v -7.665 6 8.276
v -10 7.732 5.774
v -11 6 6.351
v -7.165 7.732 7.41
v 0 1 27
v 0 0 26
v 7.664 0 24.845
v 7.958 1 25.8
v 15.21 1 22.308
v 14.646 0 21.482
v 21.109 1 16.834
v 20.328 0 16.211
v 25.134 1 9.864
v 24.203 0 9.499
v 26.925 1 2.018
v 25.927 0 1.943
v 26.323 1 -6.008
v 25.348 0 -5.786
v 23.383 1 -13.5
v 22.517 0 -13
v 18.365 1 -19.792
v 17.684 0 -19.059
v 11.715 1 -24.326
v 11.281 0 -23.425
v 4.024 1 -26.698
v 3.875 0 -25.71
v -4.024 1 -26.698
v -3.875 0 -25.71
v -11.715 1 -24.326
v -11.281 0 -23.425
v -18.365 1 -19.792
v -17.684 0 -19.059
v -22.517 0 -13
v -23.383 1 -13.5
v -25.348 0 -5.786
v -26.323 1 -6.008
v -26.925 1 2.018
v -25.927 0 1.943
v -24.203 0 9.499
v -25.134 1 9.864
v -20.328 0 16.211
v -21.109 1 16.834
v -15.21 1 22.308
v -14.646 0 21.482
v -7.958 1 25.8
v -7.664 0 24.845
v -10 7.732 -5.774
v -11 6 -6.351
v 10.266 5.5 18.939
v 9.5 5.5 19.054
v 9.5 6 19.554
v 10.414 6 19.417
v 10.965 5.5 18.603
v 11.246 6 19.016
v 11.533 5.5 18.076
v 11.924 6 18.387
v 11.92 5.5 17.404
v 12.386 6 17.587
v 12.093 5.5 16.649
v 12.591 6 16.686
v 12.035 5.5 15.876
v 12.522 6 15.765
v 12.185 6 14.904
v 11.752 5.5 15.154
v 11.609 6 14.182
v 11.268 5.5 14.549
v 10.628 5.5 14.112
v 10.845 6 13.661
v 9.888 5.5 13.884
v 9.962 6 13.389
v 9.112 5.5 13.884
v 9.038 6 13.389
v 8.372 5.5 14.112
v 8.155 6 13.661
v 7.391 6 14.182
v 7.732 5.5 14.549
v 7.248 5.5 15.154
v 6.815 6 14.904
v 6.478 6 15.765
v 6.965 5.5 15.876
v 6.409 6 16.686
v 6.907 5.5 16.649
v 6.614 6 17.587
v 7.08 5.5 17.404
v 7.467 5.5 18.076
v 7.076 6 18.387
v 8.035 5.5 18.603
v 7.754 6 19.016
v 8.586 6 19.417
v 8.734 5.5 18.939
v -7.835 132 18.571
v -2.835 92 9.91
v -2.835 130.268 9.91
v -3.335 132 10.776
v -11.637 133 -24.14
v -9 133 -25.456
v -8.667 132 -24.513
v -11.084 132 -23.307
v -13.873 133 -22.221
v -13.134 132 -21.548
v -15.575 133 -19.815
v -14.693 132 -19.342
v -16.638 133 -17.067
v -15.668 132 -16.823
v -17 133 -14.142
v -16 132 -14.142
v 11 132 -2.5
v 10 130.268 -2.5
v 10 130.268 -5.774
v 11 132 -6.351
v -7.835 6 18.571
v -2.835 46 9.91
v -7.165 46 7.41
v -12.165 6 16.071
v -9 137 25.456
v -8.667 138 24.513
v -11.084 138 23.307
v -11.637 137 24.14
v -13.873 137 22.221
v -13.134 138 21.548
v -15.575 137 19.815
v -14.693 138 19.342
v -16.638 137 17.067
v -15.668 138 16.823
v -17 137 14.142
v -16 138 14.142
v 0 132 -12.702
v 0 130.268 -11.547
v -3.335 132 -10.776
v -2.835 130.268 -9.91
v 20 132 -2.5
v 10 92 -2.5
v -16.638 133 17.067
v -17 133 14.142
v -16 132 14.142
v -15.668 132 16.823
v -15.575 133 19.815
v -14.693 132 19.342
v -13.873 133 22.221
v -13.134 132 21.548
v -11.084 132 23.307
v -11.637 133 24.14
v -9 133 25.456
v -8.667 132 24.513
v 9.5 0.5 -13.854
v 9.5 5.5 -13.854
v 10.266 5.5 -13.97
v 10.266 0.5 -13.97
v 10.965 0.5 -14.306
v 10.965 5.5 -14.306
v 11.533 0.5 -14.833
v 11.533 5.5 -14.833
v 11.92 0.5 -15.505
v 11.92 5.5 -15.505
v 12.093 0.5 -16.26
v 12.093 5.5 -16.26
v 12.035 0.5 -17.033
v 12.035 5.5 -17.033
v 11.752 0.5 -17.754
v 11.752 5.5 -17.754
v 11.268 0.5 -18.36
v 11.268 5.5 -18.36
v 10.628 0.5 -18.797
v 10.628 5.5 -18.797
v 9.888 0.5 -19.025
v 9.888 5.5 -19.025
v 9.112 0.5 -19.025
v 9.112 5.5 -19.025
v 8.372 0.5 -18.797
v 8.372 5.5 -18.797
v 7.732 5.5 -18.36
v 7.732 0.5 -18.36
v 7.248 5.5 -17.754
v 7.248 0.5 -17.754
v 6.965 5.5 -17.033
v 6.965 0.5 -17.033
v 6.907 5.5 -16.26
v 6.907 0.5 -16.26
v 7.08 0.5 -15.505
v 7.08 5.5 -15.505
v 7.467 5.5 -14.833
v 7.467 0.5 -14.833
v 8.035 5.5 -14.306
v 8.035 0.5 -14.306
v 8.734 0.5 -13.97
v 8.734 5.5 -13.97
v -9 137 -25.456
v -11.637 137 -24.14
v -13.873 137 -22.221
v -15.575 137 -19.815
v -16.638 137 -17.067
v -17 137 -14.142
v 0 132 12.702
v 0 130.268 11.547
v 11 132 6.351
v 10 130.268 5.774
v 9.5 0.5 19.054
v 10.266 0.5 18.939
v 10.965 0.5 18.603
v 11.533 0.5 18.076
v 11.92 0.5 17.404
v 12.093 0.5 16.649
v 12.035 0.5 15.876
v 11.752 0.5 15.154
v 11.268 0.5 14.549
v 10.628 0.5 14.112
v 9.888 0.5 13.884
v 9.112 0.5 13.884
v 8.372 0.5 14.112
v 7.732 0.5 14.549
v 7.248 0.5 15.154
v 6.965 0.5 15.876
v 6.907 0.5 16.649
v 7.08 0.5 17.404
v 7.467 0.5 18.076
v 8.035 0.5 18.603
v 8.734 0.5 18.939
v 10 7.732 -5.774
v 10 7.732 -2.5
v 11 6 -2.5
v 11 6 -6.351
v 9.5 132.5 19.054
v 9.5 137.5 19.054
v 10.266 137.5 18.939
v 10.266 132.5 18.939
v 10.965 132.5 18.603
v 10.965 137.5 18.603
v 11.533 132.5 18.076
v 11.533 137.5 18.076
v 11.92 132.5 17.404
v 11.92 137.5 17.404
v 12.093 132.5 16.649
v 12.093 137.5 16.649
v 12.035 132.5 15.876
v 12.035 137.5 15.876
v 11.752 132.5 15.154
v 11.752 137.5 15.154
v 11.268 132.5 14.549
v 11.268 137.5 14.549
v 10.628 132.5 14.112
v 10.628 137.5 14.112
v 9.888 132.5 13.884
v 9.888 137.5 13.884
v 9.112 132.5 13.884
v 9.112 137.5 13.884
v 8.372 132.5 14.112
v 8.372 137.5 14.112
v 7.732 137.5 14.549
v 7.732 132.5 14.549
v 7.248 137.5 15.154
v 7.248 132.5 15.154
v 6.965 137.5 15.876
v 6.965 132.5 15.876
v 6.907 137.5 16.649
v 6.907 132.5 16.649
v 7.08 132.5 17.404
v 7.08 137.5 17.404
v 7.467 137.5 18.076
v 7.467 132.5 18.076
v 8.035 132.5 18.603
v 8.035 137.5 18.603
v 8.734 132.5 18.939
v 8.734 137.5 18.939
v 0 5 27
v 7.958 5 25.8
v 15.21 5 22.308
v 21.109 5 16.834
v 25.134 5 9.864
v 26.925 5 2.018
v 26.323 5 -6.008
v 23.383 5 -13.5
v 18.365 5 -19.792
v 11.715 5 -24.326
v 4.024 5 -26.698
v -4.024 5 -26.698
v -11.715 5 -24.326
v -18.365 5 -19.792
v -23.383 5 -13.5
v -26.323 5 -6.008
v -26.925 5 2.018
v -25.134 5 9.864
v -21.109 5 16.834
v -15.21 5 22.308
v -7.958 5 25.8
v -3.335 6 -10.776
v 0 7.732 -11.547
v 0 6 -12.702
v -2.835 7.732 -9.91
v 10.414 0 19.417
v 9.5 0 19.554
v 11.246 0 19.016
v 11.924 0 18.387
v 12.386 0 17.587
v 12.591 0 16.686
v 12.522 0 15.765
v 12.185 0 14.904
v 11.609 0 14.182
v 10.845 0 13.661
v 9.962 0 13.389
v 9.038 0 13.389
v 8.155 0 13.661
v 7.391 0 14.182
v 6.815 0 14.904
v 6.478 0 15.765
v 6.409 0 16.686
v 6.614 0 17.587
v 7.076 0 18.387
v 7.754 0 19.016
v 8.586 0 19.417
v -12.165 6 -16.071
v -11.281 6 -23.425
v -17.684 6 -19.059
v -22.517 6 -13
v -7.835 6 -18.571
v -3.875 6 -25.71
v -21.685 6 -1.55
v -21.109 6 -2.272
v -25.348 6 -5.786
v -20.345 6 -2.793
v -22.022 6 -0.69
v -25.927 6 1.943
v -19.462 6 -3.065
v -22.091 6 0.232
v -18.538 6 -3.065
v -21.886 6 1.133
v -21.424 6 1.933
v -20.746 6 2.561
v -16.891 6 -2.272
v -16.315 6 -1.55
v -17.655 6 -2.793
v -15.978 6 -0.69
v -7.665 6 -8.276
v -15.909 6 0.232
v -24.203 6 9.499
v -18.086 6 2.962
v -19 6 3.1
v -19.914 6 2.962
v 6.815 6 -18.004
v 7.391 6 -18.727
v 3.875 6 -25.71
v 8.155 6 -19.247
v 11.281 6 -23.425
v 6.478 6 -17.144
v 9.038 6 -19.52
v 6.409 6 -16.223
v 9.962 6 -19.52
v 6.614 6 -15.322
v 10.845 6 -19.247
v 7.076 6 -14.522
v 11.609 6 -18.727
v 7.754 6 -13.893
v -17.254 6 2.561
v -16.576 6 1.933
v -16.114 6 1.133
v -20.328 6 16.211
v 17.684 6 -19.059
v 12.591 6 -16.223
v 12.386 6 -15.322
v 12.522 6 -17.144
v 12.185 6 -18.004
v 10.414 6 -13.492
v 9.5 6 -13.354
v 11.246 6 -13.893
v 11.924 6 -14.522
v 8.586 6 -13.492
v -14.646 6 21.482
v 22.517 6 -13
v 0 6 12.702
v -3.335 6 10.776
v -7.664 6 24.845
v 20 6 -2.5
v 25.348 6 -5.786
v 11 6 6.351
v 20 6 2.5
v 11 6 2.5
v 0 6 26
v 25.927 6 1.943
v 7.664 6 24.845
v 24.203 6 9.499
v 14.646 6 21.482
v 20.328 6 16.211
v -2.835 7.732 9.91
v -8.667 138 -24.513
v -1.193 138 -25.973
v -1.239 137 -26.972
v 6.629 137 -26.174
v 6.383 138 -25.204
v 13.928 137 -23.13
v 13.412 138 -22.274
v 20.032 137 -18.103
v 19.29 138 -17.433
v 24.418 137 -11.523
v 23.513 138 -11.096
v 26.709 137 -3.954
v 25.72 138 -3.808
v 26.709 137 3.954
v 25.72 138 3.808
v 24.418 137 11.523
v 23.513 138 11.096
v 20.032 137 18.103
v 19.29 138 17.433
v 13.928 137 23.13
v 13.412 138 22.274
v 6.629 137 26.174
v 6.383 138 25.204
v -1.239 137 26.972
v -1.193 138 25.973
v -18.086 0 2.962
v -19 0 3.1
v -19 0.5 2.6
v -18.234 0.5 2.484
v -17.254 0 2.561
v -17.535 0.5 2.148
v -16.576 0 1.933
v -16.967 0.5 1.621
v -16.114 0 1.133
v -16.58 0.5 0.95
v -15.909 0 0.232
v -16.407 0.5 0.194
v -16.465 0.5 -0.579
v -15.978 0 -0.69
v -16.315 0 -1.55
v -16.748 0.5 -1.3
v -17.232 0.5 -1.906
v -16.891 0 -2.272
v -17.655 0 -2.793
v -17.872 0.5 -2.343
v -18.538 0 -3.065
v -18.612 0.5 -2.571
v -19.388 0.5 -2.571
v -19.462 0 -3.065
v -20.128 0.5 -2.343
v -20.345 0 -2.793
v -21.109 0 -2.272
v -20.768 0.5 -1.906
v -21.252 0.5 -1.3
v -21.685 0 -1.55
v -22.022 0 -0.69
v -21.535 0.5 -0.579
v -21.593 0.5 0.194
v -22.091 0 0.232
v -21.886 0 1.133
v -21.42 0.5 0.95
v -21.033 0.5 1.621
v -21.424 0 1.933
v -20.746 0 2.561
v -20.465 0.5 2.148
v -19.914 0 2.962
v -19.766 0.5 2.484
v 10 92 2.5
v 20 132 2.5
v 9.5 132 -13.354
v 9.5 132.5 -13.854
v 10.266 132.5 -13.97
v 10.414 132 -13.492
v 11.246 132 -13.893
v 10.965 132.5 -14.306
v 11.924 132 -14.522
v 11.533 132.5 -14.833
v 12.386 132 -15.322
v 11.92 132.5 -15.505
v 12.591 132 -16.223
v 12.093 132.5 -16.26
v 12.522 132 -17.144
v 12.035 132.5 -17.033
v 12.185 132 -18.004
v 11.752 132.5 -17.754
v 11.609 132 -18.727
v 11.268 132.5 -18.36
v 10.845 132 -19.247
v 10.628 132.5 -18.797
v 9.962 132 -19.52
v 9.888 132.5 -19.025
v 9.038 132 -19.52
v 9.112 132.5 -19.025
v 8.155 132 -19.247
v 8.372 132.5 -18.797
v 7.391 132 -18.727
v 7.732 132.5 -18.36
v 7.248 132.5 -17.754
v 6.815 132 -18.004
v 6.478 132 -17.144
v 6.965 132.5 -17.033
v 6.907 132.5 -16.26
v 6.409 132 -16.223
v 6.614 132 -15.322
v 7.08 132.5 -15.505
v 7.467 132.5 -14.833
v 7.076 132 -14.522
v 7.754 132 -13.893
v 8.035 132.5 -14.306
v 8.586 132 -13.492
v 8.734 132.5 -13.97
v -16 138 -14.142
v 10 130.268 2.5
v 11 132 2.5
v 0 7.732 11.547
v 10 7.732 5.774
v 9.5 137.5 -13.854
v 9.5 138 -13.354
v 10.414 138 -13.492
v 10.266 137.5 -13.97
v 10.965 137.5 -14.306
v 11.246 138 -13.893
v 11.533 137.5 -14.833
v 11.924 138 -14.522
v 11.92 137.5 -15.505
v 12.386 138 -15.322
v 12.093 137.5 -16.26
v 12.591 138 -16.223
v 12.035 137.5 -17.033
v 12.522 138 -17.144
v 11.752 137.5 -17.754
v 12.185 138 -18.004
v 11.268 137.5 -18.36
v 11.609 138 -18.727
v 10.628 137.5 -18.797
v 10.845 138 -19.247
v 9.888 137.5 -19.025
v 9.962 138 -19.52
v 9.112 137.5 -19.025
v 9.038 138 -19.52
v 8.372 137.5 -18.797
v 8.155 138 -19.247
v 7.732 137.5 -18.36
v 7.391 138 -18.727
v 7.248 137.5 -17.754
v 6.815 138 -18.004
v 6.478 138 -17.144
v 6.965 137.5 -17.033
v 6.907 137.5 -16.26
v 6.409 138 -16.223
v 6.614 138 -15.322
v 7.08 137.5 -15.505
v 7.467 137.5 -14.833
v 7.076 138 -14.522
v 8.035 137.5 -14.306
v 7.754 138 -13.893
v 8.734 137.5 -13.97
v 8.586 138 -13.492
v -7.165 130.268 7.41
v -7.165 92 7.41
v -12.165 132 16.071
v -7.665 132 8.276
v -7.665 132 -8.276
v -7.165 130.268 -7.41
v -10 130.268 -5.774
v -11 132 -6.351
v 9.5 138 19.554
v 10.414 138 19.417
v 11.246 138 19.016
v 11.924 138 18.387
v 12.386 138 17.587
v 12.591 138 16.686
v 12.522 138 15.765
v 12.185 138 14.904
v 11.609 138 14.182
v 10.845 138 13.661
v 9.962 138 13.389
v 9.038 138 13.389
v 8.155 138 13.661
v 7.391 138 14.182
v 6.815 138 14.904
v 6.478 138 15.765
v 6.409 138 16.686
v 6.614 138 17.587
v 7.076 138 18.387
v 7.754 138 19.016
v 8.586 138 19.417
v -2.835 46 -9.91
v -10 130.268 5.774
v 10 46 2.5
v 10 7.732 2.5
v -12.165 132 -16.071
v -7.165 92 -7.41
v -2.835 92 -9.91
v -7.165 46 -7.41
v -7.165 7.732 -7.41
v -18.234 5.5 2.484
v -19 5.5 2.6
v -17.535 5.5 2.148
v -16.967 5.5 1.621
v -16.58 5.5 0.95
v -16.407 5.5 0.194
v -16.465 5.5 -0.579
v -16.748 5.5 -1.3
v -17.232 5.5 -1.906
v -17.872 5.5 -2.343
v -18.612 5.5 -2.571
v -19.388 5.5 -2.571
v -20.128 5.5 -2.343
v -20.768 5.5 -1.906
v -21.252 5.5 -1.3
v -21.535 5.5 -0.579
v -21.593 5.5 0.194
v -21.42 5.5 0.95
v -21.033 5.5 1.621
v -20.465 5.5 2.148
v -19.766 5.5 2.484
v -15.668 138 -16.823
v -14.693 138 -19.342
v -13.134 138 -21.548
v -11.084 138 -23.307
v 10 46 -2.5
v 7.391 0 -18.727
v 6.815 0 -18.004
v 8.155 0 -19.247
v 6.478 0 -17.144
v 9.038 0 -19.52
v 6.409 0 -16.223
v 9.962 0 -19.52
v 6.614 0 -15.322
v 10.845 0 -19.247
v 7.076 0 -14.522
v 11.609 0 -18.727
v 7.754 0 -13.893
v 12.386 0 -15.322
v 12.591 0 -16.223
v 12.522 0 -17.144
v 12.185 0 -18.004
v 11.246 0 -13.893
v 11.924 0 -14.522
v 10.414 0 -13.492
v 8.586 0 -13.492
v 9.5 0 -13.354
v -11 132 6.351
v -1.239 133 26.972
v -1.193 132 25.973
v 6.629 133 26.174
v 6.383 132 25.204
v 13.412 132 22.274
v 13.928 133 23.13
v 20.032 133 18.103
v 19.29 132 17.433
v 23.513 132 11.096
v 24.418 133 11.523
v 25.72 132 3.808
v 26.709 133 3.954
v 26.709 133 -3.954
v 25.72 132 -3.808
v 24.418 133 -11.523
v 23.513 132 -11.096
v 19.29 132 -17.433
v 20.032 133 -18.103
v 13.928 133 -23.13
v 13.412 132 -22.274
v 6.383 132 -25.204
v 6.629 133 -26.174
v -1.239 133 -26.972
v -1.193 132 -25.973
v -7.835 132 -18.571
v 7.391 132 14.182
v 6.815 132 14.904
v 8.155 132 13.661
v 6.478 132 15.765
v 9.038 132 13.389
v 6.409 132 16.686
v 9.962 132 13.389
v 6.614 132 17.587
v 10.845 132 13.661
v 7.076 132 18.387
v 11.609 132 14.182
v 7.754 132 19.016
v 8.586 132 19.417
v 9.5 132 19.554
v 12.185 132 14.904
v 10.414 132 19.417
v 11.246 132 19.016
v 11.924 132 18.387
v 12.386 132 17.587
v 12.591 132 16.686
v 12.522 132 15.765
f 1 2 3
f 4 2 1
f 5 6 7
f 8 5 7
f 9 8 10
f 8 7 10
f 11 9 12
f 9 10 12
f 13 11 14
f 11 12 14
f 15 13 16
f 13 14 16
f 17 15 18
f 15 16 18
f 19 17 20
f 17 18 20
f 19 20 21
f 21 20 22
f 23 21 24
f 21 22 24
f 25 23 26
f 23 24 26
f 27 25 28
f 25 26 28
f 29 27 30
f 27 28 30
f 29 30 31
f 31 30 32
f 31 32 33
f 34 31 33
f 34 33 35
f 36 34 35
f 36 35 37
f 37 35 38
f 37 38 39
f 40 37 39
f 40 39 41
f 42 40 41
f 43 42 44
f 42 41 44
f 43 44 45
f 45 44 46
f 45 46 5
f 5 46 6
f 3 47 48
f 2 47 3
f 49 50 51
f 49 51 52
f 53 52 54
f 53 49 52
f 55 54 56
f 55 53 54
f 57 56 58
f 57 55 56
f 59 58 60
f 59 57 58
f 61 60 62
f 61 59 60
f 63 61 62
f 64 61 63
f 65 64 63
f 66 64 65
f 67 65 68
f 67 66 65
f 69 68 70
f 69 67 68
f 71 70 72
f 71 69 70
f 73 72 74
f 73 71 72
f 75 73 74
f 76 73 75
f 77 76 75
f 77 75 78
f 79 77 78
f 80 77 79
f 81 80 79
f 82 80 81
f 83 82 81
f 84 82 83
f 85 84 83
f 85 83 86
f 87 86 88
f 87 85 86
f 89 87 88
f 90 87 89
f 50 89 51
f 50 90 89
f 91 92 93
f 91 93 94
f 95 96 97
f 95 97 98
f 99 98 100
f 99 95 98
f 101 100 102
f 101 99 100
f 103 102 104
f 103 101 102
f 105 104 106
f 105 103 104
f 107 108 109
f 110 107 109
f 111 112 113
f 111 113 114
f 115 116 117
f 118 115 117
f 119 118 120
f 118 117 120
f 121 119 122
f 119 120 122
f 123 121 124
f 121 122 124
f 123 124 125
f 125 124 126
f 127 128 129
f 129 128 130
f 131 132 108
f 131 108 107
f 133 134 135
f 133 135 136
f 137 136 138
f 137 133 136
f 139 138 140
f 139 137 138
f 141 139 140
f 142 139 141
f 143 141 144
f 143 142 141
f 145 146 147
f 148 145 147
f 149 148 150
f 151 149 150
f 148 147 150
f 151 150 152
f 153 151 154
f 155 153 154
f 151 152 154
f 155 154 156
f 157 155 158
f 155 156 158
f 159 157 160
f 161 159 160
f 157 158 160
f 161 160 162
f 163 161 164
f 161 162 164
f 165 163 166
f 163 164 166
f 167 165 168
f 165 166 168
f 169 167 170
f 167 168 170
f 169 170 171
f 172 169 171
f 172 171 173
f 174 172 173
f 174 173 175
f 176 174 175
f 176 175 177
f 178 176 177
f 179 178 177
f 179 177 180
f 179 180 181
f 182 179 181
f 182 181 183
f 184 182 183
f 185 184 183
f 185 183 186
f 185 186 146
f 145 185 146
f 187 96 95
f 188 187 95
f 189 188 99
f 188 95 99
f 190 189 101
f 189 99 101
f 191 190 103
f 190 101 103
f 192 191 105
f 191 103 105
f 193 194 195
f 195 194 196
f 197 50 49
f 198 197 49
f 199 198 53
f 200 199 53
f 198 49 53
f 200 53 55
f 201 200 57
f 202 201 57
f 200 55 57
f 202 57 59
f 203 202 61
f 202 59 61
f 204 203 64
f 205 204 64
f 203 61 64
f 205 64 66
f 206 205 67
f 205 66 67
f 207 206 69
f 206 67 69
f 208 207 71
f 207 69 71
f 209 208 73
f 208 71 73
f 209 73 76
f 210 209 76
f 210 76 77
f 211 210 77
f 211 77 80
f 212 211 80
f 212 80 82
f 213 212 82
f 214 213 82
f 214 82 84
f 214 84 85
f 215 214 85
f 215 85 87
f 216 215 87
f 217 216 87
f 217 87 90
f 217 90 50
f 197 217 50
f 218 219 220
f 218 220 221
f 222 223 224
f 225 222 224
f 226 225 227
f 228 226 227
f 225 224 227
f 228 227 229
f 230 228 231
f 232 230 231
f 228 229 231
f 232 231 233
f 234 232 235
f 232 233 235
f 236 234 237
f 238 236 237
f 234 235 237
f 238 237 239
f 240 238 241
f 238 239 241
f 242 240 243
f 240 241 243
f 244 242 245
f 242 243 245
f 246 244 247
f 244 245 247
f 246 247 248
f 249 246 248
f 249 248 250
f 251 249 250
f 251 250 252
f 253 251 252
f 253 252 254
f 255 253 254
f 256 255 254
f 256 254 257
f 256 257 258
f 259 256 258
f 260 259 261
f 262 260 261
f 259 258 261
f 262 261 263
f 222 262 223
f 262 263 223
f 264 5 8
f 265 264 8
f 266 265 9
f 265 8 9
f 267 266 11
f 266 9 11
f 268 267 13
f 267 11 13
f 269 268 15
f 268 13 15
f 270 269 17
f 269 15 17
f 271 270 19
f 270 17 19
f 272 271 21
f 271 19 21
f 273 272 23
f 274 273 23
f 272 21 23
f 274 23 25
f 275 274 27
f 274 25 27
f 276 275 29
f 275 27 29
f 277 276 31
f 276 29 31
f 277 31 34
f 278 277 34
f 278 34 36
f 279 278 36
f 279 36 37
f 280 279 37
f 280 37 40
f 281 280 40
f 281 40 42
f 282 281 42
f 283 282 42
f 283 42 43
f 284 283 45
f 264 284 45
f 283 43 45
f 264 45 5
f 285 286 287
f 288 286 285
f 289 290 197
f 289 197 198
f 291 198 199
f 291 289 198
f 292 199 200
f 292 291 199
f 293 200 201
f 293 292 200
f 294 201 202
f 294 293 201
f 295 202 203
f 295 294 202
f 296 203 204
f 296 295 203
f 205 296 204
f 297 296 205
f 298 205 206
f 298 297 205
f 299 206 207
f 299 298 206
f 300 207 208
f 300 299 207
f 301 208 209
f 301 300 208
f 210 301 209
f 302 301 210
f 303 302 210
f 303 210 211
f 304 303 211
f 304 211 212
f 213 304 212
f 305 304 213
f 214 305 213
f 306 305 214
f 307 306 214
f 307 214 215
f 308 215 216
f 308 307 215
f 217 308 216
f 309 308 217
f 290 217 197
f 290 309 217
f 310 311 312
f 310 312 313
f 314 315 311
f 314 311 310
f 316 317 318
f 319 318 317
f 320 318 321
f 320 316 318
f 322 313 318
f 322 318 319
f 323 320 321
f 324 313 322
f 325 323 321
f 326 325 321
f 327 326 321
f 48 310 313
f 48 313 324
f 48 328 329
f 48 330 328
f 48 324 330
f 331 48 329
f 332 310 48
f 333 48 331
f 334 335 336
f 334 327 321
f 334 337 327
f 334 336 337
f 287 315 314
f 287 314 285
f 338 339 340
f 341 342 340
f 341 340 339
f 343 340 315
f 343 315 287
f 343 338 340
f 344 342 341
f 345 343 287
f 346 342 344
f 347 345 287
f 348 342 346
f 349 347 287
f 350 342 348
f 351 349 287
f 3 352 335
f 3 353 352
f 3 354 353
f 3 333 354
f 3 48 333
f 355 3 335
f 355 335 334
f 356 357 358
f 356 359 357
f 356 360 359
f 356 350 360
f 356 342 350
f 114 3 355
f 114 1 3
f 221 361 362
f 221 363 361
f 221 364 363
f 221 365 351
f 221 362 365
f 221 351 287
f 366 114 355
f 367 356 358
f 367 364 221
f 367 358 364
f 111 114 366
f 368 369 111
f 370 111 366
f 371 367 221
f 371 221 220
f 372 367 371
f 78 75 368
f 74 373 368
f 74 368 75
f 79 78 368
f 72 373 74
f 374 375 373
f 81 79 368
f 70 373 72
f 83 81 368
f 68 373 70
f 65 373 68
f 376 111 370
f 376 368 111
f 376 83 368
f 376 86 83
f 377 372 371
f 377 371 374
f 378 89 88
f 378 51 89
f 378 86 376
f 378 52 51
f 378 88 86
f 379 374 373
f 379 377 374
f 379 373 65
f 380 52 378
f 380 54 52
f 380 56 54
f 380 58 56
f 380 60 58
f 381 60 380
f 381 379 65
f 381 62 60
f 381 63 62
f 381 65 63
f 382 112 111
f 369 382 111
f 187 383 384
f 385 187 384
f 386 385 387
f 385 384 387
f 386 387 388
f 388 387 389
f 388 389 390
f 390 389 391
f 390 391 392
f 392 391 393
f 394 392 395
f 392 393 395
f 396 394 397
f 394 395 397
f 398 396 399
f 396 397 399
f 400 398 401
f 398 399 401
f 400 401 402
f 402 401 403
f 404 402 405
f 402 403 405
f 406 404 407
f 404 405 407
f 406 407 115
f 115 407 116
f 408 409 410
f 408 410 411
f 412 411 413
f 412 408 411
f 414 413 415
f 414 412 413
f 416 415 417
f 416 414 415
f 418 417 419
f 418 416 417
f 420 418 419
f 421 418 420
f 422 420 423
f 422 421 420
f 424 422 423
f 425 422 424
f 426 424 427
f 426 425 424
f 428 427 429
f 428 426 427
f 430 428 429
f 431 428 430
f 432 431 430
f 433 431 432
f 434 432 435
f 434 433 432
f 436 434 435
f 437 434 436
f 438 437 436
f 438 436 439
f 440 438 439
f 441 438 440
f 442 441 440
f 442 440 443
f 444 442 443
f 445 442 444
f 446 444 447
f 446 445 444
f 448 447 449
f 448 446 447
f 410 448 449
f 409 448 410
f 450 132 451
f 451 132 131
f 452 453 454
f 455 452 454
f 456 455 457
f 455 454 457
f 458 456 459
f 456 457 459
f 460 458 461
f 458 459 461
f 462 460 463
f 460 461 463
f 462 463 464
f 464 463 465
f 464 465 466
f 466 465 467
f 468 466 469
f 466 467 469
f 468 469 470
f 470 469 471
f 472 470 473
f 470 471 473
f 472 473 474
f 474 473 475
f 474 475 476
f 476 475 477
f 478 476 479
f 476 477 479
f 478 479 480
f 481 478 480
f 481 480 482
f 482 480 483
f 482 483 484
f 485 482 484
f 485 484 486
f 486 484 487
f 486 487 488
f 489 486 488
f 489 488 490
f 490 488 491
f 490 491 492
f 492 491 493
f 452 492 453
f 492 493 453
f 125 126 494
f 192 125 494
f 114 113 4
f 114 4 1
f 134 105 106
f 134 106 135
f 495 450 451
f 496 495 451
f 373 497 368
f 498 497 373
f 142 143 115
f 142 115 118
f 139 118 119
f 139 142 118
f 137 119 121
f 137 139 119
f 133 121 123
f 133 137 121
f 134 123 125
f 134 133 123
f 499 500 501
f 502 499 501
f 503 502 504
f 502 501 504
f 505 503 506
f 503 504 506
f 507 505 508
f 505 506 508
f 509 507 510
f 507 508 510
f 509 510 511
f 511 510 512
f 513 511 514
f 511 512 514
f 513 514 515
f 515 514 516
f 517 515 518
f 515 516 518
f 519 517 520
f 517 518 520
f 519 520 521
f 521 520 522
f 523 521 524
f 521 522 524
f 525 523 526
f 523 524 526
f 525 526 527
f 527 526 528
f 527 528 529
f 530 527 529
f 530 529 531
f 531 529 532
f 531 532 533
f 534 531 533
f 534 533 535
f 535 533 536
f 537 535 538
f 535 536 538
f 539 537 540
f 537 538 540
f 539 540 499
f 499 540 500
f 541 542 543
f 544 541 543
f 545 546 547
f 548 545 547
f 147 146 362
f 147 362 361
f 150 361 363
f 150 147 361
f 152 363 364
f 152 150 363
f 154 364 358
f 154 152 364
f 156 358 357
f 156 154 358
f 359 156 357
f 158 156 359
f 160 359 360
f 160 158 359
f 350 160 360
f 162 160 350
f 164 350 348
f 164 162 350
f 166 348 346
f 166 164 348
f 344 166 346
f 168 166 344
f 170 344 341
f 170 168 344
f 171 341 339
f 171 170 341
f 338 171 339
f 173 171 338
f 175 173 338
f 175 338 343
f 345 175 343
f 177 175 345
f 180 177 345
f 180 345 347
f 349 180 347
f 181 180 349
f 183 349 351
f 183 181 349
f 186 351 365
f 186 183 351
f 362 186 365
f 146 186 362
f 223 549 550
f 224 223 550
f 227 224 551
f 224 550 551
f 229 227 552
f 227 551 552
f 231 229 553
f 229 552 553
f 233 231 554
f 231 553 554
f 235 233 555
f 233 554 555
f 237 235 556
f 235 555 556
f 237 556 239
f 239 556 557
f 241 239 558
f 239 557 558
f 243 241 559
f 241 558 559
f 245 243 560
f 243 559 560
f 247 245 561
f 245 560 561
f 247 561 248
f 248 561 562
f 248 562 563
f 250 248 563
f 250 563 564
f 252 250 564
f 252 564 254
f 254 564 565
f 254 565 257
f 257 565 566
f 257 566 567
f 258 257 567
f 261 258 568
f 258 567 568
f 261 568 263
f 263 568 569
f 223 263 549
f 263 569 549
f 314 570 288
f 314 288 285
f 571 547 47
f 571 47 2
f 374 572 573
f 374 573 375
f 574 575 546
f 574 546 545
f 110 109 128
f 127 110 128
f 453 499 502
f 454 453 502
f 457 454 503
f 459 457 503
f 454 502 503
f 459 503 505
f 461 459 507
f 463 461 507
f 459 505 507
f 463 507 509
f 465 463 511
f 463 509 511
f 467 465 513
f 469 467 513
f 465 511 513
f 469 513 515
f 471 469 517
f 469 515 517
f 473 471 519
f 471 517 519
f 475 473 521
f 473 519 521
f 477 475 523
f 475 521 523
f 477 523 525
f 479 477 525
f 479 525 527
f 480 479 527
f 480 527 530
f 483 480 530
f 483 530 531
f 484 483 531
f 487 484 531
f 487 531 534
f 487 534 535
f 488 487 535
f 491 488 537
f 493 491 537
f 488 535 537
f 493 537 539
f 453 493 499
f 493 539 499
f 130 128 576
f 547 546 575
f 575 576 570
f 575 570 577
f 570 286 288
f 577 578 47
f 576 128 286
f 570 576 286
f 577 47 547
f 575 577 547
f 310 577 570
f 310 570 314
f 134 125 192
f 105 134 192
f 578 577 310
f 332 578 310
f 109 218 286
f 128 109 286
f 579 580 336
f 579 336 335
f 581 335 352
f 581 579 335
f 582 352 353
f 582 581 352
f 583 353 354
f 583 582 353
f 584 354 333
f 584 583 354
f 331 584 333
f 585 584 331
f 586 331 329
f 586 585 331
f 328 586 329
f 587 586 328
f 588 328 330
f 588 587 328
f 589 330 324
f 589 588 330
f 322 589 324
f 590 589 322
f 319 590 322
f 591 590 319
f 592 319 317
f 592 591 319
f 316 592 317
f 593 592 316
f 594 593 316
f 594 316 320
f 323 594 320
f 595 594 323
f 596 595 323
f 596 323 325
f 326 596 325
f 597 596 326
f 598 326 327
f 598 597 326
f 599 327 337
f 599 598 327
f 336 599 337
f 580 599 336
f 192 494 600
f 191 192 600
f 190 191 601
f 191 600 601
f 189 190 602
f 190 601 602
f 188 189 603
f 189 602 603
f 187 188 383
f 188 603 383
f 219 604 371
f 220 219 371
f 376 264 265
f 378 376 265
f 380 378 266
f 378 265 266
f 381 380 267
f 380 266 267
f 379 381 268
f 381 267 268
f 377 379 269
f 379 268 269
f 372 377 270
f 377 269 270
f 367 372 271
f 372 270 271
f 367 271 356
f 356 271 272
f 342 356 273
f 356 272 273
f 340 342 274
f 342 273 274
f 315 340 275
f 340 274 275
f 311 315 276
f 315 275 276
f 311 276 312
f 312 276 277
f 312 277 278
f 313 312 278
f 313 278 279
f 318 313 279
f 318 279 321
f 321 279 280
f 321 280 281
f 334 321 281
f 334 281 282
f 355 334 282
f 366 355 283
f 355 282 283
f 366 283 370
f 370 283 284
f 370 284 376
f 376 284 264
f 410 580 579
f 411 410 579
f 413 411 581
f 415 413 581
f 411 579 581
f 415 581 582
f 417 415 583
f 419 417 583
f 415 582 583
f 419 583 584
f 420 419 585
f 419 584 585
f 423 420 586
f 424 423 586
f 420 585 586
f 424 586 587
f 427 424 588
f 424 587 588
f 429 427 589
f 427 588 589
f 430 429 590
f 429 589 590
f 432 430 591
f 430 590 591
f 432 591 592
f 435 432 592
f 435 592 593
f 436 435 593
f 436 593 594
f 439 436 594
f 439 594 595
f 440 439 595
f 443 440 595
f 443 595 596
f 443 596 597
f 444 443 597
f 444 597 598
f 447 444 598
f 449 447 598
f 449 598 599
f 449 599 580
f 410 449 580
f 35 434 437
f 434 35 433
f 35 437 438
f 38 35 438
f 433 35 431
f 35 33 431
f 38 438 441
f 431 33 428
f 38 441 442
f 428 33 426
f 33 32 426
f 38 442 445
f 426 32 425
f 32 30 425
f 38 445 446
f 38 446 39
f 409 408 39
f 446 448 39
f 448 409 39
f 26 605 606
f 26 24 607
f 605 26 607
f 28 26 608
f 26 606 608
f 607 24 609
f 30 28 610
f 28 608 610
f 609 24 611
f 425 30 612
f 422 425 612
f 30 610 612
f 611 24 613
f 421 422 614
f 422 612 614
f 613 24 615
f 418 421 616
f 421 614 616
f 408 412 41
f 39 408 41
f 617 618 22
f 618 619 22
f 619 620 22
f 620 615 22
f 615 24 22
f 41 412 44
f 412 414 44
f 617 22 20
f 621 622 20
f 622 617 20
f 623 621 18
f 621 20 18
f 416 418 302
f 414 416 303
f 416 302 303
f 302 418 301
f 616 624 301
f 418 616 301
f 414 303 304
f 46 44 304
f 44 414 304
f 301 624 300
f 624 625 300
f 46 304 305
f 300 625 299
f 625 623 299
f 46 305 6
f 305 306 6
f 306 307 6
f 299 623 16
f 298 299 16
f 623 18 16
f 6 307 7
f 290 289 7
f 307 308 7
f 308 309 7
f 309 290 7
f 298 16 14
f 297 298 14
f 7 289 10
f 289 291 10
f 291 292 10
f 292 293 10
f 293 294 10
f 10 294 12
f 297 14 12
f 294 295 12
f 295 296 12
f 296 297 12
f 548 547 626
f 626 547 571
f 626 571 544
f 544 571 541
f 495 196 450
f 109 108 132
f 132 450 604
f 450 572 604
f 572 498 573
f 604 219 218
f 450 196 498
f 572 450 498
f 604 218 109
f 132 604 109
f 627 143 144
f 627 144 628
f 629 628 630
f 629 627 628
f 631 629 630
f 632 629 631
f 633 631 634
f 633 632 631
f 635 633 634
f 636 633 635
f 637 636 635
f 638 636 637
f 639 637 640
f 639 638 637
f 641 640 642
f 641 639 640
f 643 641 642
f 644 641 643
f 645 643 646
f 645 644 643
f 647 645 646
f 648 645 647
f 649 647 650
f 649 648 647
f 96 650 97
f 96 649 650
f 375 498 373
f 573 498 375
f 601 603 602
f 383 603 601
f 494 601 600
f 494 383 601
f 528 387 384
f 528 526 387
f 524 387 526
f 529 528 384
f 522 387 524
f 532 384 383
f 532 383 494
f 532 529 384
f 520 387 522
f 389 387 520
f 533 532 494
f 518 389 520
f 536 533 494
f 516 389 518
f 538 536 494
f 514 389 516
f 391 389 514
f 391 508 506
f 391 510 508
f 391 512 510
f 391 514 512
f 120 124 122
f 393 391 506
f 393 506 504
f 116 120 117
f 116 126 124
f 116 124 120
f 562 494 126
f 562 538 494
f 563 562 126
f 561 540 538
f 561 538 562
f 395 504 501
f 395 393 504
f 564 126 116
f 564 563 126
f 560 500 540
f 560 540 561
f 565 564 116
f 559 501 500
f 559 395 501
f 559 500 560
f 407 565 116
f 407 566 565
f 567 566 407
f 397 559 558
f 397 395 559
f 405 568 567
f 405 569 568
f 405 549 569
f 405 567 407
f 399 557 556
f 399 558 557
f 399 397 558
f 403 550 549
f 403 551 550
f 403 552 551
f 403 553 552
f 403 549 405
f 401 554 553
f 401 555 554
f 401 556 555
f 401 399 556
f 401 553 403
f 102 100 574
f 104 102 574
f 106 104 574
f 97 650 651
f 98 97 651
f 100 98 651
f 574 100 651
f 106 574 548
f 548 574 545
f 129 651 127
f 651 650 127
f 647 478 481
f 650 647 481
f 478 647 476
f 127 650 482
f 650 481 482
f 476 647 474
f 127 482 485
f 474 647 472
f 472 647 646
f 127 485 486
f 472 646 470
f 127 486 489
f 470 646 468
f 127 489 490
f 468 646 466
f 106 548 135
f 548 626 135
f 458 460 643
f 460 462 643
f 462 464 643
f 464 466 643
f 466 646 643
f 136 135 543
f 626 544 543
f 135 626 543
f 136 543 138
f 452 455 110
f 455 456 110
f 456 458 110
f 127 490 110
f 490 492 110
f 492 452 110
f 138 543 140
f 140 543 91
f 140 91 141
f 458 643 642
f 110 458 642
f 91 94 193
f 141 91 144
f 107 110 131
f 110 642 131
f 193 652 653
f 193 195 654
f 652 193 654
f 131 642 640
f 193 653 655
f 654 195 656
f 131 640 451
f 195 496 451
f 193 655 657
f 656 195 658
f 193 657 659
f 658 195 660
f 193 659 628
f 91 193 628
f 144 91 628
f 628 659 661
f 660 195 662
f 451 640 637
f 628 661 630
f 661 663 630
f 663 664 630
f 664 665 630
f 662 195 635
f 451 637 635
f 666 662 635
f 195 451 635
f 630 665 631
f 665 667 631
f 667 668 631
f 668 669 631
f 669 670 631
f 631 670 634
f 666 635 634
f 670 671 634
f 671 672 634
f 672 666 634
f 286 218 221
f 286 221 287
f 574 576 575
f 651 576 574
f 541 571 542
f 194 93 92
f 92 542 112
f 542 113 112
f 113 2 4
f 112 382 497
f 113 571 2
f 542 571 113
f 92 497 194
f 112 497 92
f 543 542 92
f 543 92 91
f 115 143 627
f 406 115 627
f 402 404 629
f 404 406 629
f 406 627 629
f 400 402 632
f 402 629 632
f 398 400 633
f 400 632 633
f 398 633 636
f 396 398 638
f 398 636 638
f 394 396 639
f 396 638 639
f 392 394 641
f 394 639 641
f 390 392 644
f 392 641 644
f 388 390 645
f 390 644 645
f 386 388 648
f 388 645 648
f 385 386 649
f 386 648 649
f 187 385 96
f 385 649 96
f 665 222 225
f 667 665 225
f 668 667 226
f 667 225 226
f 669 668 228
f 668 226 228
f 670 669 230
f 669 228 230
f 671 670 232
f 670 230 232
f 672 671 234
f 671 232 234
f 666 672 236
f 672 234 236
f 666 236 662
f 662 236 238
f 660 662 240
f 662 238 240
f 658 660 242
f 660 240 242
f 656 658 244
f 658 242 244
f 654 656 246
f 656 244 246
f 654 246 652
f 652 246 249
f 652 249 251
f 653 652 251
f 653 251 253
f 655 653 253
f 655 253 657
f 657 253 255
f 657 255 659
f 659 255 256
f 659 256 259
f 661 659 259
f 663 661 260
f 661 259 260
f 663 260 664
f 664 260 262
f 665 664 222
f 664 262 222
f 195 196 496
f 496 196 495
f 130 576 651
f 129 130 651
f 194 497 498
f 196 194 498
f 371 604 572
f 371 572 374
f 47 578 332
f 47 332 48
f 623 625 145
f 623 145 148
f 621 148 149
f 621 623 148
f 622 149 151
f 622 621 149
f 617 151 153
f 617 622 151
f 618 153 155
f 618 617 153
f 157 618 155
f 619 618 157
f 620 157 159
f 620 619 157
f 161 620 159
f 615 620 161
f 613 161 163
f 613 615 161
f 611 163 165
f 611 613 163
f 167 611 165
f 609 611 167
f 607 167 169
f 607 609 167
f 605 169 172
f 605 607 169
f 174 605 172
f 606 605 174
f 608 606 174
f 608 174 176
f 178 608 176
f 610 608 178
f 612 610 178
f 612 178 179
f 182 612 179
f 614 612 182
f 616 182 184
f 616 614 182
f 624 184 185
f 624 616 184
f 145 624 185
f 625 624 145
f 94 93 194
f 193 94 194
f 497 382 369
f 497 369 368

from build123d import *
from OCP.BRepFilletAPI import BRepFilletAPI_MakeChamfer

# Parameters (mm, degrees)
SKETCH3_R               = 27
BOSS_EXTRUDE1_DEPTH     = 6
BOSS_EXTRUDE2_DEPTH     = 126
SKETCH19_R              = 27
BOSS_EXTRUDE3_DEPTH     = 6
CUT_EXTRUDE5_REACH      = 139.412
SKETCH13_R              = 2.6
CUT_EXTRUDE6_REACH      = 145.185
SKETCH20_R              = 2.6
CUT_EXTRUDE7_REACH      = 145.185
SKETCH21_W              = 10
SKETCH21_H              = 41.952353926
RIB3_REACH              = 145.185
SKETCH18_WALL_W         = 329.601445786
SKETCH18_WALL_H         = 5
CIRPATTERN1_COUNT       = 3
MIRROR2_COPY_1_REACH    = 145.185
MIRROR2_COPY_1_SKETCH_W = 329.601445786
MIRROR2_COPY_1_SKETCH_H = 5
MIRROR2_COPY_2_REACH    = 145.185
MIRROR2_COPY_2_SKETCH_W = 329.601445786
MIRROR2_COPY_2_SKETCH_H = 5
FILLET1_R               = 12
CHAMFER1_SIZE           = 1
CHAMFER1_SIZE2          = 1.732050808
CHAMFER2_SIZE           = 1
CHAMFER3_SIZE           = 0.5


with BuildPart() as part:
    # Sketch3 → Boss-Extrude1 (new body)
    with BuildSketch(Plane(origin=(0, 0, 0), x_dir=(1, 0, 0), z_dir=(0, 1, 0))):
        with Locations(Location((0, 0, 0), (0, 0, 270))):
            Circle(SKETCH3_R)
    extrude(amount=BOSS_EXTRUDE1_DEPTH)

    # Sketch4 → Boss-Extrude2 (add)
    with BuildSketch(Plane(origin=(0, 6, 0), x_dir=(1, 0, 0), z_dir=(0, 1, 0))):
        Polygon((10, -5.773502692), (10, 5.773502692), (0, 11.547005384), (-10, 5.773502692), (-10, -5.773502692), (0, -11.547005384), align=None)
    extrude(amount=BOSS_EXTRUDE2_DEPTH)

    # Sketch19 → Boss-Extrude3 (add)
    with BuildSketch(Plane(origin=(0, 132, 0), x_dir=(1, 0, 0), z_dir=(0, 1, 0))):
        with Locations(Location((0, 0, 0), (0, 0, 270))):
            Circle(SKETCH19_R)
    extrude(amount=BOSS_EXTRUDE3_DEPTH)

    # Sketch13 → Cut-Extrude5 (cut, up to next)
    with BuildSketch(Plane(origin=(0, 6, 0), x_dir=(1, 0, 0), z_dir=(0, 1, 0)), mode=Mode.PRIVATE) as cut_extrude5_sk1:
        with Locations(Location((-19, 0, 0), (0, 0, 270))):
            Circle(SKETCH13_R)
    cut_extrude5_tool1 = extrude(cut_extrude5_sk1.sketch, amount=-CUT_EXTRUDE5_REACH, mode=Mode.PRIVATE) & part.part
    # Sketch13 → Cut-Extrude5 (cut, up to next)
    with BuildSketch(Plane(origin=(0, 6, 0), x_dir=(1, 0, 0), z_dir=(0, 1, 0)), mode=Mode.PRIVATE) as cut_extrude5_sk2:
        with Locations(Location((9.5, 16.454482672, 0), (0, 0, 270))):
            Circle(SKETCH13_R)
    cut_extrude5_tool2 = extrude(cut_extrude5_sk2.sketch, amount=-CUT_EXTRUDE5_REACH, mode=Mode.PRIVATE) & part.part
    # Sketch13 → Cut-Extrude5 (cut, up to next)
    with BuildSketch(Plane(origin=(0, 6, 0), x_dir=(1, 0, 0), z_dir=(0, 1, 0)), mode=Mode.PRIVATE) as cut_extrude5_sk3:
        with Locations(Location((9.5, -16.454482672, 0), (0, 0, 270))):
            Circle(SKETCH13_R)
    cut_extrude5_tool3 = extrude(cut_extrude5_sk3.sketch, amount=-CUT_EXTRUDE5_REACH, mode=Mode.PRIVATE) & part.part
    add(cut_extrude5_tool1.solids().sort_by_distance((-19, 6, 0))[0], mode=Mode.SUBTRACT)
    add(cut_extrude5_tool2.solids().sort_by_distance((9.5, 6, -16.454483))[0], mode=Mode.SUBTRACT)
    add(cut_extrude5_tool3.solids().sort_by_distance((9.5, 6, 16.454483))[0], mode=Mode.SUBTRACT)

    # Sketch20 → Cut-Extrude6 (cut, up to next)
    with BuildSketch(Plane(origin=(0, 138, 0), x_dir=(1, 0, 0), z_dir=(0, 1, 0)), mode=Mode.PRIVATE) as cut_extrude6_sk1:
        with Locations(Location((9.5, 16.454482672, 0), (0, 0, 270))):
            Circle(SKETCH20_R)
    cut_extrude6_tool1 = extrude(cut_extrude6_sk1.sketch, amount=-CUT_EXTRUDE6_REACH, mode=Mode.PRIVATE) & part.part
    # Sketch20 → Cut-Extrude6 (cut, up to next)
    with BuildSketch(Plane(origin=(0, 138, 0), x_dir=(1, 0, 0), z_dir=(0, 1, 0)), mode=Mode.PRIVATE) as cut_extrude6_sk2:
        with Locations(Location((9.5, -16.454482672, 0), (0, 0, 270))):
            Circle(SKETCH20_R)
    cut_extrude6_tool2 = extrude(cut_extrude6_sk2.sketch, amount=-CUT_EXTRUDE6_REACH, mode=Mode.PRIVATE) & part.part
    add(cut_extrude6_tool1.solids().sort_by_distance((9.5, 138, -16.454483))[0], mode=Mode.SUBTRACT)
    add(cut_extrude6_tool2.solids().sort_by_distance((9.5, 138, 16.454483))[0], mode=Mode.SUBTRACT)

    # Sketch21 → Cut-Extrude7 (cut, up to next)
    with BuildSketch(Plane(origin=(0, 138, 0), x_dir=(1, 0, 0), z_dir=(0, 1, 0)), mode=Mode.PRIVATE) as cut_extrude7_sk1:
        with Locations((-22, 0)):
            Rectangle(SKETCH21_W, SKETCH21_H)
    cut_extrude7_tool1 = extrude(cut_extrude7_sk1.sketch, amount=-CUT_EXTRUDE7_REACH, mode=Mode.PRIVATE) & part.part
    add(cut_extrude7_tool1.solids().sort_by_distance((-22, 138, 0))[0], mode=Mode.SUBTRACT)

    # Sketch18 wall → Rib3 (add, up to next)
    with BuildSketch(Plane(origin=(15, 26, 0), x_dir=(0.242535625036, -0.970142500145, 0), z_dir=(0.970142500145, 0.242535625036, 0)), mode=Mode.PRIVATE) as rib3_sk1:
        Rectangle(SKETCH18_WALL_W, SKETCH18_WALL_H)
    rib3_tool1 = extrude(rib3_sk1.sketch, amount=-RIB3_REACH, mode=Mode.PRIVATE) - part.part
    rib3 = rib3_tool1.solids().sort_by_distance((15, 26, 0))[0]
    add(rib3)

    # CirPattern1: Rib3 ×3 about axis
    cirpattern1_axis = Axis((0, 0, 0), (0, 1, 0))
    for i in range(1, CIRPATTERN1_COUNT):
        add(rib3.rotate(cirpattern1_axis, i * 360 / CIRPATTERN1_COUNT))

    # Mirror2: Rib3 across plane
    add(rib3.mirror(Plane.ZX.offset(69)))

    # Mirror2 copy 1 sketch → Mirror2 copy 1 (add, up to next)
    with BuildSketch(Plane(origin=(-7.5, 112, -12.990381057), x_dir=(-0.12126781251799995, 0.970142500145, -0.21004201260391314), z_dir=(-0.4850712500724998, -0.242535625036, -0.8401680504165185)), mode=Mode.PRIVATE) as mirror2_copy_1_sk1:
        Rectangle(MIRROR2_COPY_1_SKETCH_W, MIRROR2_COPY_1_SKETCH_H)
    mirror2_copy_1_tool1 = extrude(mirror2_copy_1_sk1.sketch, amount=-MIRROR2_COPY_1_REACH, mode=Mode.PRIVATE) - part.part
    add(mirror2_copy_1_tool1.solids().sort_by_distance((-7.5, 112, -12.990381057))[0])

    # Mirror2 copy 2 sketch → Mirror2 copy 2 (add, up to next)
    with BuildSketch(Plane(origin=(-7.5, 112, 12.990381057), x_dir=(-0.12126781251800012, 0.970142500145, 0.21004201260391306), z_dir=(-0.48507125007250046, -0.242535625036, 0.8401680504165182)), mode=Mode.PRIVATE) as mirror2_copy_2_sk1:
        Rectangle(MIRROR2_COPY_2_SKETCH_W, MIRROR2_COPY_2_SKETCH_H)
    mirror2_copy_2_tool1 = extrude(mirror2_copy_2_sk1.sketch, amount=-MIRROR2_COPY_2_REACH, mode=Mode.PRIVATE) - part.part
    add(mirror2_copy_2_tool1.solids().sort_by_distance((-7.5, 112, 12.990381057))[0])

    # Fillet1
    fillet1_edges = [part.edges().sort_by_distance(p)[0] for p in [
        (-17, 135, 20.976176963),
        (-17, 135, -20.976176963),
    ]]
    fillet(fillet1_edges, radius=FILLET1_R)

    # Chamfer1: one chamfer whose edges measure the first distance from different faces: ONE call of the kernel's chamfer builder (chamfer() names one face for all edges)
    chamfer1_edges_1 = [part.edges().sort_by_distance(p)[0] for p in [
        (10, 132, 4.136751346),
        (5, 132, -8.660254038),
        (-1.417468245, 132, -10.728629711),
        (-10, 132, 0),
        (-8.582531755, 132, 6.591878365),
        (10, 132, -4.136751346),
        (-1.417468245, 132, 10.728629711),
        (-8.582531755, 132, -6.591878365),
        (5, 132, 8.660254038),
    ]]
    chamfer1_side_1 = [part.faces().sort_by_distance(p)[0] for p in [
        (26.303437009, 132, 0),
    ]]
    chamfer1_edges_2 = [part.edges().sort_by_distance(p)[0] for p in [
        (-1.417468245, 6, 10.728629711),
        (-8.582531755, 6, -6.591878365),
        (10, 6, -4.136751346),
        (5, 6, 8.660254038),
        (10, 6, 4.136751346),
        (5, 6, -8.660254038),
        (-1.417468245, 6, -10.728629711),
        (-10, 6, 0),
        (-8.582531755, 6, 6.591878365),
    ]]
    chamfer1_side_2 = [part.faces().sort_by_distance(p)[0] for p in [
        (0, 6, -26.236324676),
    ]]
    chamfer1 = BRepFilletAPI_MakeChamfer(part.part.solid().wrapped)
    for e in chamfer1_edges_1:
        chamfer1.Add(CHAMFER1_SIZE, CHAMFER1_SIZE2, e.wrapped, chamfer1_side_1[0].wrapped)  # the first distance lies on this face
    for e in chamfer1_edges_2:
        chamfer1.Add(CHAMFER1_SIZE, CHAMFER1_SIZE2, e.wrapped, chamfer1_side_2[0].wrapped)  # the first distance lies on this face
    add(Compound.cast(chamfer1.Shape()), mode=Mode.REPLACE)

    # Chamfer2
    chamfer2_edges = [part.edges().sort_by_distance(p)[0] for p in [
        (0, 0, -27),
        (-17, 138, 0),
        (-17, 132, 0),
        (27, 132, 0),
        (-14.797958971, 132, 21.070338854),
        (-14.797958971, 132, -21.070338854),
        (27, 138, 0),
        (-14.797958971, 138, 21.070338854),
        (-14.797958971, 138, -21.070338854),
        (0, 6, -27),
    ]]
    chamfer(chamfer2_edges, length=CHAMFER2_SIZE)

    # Chamfer3
    chamfer3_edges = [part.edges().sort_by_distance(p)[0] for p in [
        (-19, 6, -2.6),
        (-19, 0, -2.6),
        (9.5, 6, -19.054482672),
        (9.5, 0, -19.054482672),
        (9.5, 6, 13.854482672),
        (9.5, 0, 13.854482672),
        (9.5, 132, -19.054482672),
        (9.5, 138, -19.054482672),
        (9.5, 132, 13.854482672),
        (9.5, 138, 13.854482672),
    ]]
    chamfer(chamfer3_edges, length=CHAMFER3_SIZE)


solid = part.part
